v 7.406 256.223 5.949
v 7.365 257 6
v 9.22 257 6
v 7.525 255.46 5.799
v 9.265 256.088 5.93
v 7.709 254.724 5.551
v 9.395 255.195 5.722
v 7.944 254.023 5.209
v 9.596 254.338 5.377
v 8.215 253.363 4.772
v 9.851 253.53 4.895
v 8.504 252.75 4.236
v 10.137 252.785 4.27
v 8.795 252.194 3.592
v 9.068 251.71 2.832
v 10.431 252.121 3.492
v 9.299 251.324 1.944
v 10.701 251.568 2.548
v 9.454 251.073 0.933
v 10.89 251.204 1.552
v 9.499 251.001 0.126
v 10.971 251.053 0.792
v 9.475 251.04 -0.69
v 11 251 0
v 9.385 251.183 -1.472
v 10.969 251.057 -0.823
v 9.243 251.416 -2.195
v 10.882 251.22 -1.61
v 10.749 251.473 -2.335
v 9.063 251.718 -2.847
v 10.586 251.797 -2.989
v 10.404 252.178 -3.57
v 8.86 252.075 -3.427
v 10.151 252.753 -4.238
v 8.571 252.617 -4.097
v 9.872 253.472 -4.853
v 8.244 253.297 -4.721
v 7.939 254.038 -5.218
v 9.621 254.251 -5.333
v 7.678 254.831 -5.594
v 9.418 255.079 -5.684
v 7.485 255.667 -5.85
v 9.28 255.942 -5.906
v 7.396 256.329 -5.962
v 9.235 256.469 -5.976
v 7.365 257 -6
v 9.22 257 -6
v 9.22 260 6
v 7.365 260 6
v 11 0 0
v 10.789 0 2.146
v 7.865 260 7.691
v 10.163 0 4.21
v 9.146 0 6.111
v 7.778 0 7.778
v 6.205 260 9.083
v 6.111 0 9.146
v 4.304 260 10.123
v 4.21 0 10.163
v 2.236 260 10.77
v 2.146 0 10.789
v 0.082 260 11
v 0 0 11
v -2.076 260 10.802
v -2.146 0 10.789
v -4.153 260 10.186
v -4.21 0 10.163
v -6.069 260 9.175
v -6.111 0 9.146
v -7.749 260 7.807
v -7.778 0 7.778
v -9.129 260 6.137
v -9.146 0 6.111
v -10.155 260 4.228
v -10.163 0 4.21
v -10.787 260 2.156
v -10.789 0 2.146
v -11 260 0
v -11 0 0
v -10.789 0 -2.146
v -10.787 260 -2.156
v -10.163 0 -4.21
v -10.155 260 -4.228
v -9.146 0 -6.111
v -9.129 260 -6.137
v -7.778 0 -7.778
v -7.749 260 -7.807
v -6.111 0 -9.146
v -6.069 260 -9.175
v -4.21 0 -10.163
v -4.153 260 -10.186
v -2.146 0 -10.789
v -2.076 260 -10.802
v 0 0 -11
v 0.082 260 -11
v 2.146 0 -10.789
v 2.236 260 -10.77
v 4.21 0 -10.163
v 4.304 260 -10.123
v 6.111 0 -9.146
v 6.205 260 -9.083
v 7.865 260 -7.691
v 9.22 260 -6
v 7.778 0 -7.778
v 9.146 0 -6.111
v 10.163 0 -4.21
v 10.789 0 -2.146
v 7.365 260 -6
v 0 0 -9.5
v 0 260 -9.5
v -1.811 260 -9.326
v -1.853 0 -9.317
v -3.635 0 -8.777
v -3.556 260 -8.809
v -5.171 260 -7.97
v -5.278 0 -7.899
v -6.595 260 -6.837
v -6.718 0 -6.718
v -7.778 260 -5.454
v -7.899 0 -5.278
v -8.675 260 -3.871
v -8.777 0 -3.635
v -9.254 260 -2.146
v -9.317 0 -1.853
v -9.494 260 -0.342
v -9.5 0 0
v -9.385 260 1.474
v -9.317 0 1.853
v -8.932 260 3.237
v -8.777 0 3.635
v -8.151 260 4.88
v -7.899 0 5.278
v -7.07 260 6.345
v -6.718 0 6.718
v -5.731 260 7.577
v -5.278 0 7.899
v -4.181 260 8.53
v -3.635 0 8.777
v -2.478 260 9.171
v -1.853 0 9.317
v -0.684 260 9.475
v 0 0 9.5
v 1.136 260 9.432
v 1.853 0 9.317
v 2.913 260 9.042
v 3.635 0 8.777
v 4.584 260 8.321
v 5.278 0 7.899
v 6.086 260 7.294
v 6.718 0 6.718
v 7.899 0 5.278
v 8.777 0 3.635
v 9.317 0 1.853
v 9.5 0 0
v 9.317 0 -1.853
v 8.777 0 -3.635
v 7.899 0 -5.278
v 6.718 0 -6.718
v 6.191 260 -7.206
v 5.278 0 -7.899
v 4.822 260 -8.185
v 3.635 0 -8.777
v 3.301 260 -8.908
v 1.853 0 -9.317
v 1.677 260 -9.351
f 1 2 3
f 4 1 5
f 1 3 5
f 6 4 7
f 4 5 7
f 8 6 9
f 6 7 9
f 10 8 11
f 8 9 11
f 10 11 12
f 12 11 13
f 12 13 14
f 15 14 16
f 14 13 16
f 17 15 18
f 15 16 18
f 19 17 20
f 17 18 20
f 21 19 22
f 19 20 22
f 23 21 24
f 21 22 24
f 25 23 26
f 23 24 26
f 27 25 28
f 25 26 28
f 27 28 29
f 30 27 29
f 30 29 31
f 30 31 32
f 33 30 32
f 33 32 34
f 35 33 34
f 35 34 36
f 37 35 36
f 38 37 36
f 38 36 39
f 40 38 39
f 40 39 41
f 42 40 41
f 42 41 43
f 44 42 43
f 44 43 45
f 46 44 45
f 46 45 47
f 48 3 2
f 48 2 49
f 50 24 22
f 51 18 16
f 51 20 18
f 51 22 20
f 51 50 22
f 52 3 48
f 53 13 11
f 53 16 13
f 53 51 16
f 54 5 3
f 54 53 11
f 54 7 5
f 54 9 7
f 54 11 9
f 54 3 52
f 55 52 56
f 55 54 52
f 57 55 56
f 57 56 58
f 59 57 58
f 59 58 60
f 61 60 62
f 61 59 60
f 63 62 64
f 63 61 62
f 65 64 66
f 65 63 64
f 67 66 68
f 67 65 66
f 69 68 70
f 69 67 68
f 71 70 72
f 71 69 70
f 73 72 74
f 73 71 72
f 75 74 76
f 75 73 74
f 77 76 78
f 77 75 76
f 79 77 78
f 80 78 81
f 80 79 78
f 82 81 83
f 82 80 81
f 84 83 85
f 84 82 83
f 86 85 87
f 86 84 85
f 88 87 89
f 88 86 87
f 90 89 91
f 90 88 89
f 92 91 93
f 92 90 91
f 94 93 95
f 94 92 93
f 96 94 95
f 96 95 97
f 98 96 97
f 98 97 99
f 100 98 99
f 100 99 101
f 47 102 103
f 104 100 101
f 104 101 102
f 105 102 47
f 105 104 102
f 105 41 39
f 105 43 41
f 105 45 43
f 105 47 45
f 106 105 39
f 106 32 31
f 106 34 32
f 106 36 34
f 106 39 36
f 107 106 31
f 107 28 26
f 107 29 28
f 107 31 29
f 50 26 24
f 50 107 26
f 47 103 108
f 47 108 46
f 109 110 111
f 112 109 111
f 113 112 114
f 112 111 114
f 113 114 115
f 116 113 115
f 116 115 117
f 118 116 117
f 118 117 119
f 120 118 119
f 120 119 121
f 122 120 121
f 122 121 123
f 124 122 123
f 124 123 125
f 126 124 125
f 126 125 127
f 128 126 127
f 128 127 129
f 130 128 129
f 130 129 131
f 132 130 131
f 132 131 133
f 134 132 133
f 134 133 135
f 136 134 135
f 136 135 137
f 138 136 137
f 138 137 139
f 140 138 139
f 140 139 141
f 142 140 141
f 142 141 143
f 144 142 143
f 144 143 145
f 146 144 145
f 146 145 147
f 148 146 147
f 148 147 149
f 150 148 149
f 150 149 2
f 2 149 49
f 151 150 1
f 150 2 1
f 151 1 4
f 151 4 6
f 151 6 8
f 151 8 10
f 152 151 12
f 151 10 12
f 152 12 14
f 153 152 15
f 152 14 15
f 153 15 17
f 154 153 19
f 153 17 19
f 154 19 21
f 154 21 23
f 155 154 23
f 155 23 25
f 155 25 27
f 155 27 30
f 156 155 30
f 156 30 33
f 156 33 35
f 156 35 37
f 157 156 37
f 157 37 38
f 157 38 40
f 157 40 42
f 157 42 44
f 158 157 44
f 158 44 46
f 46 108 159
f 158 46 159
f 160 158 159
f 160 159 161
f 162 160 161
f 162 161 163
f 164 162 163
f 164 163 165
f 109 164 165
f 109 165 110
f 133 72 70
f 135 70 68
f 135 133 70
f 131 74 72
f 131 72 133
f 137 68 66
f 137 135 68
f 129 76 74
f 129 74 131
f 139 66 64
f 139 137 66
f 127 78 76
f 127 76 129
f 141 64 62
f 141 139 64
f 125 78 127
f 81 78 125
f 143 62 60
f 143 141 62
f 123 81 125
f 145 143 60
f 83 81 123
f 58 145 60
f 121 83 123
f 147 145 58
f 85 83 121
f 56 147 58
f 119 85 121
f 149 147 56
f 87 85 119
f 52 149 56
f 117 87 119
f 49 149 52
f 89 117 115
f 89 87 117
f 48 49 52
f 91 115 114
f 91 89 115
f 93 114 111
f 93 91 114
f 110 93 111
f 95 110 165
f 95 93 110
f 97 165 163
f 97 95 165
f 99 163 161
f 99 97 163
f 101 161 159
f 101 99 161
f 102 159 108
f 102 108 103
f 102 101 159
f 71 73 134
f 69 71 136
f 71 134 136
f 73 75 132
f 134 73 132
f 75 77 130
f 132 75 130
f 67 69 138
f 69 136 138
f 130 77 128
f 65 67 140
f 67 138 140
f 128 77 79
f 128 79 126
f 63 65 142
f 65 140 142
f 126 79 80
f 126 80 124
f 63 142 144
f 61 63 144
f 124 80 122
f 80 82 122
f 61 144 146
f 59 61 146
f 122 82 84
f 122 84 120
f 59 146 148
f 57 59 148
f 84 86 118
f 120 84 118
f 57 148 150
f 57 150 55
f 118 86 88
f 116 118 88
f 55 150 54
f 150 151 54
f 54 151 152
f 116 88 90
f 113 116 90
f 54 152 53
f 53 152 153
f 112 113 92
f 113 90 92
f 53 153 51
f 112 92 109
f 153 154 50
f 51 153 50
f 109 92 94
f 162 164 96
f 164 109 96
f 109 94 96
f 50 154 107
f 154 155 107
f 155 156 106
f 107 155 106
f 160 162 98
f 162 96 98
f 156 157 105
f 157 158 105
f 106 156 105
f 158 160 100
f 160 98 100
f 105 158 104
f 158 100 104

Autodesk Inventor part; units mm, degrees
ref_plane "XZ Plane" through (0, 0, 0) normal (0, 1, 0) x (-1, 0, 0)
ref_plane "XY Plane" through (0, 0, 0) normal (0, 0, 1) x (1, 0, 0)
sketch "Sketch1" plane through (0, 0, 0) normal (0, 0, 1) x (1, 0, 0)
  line L0 (0, 0) -> (0, 260)
  line L1 (0, 260) -> (11, 260)
  line L2 (11, 260) -> (11, 0)
  line L3 (11, 0) -> (0, 0)
  dimension "d0" = 22
  dimension "d1" = 260
revolve "Revolution1" add sketch "Sketch1" angle 360 about axis through (0, 0, 0) along (0, 1, 0)
sketch "Sketch2" plane through (0, 0, 0) normal (0, -1, 0) x (1, 0, 0)
  circle A0 centre (0, 0) radius 11 projected
hole "Hole1" at (0, 0, 0) direction (0, 1, 0) diameter 19 depth 260
ref_plane "Work Plane1" through (11, 0, 0) normal (1, 0, 0) x (0, 1, 0)
sketch "Sketch3" plane through (11, 0, 0) normal (1, 0, 0) x (0, 1, 0)
  line L0 (260, -11) -> (260, 11) projected
  line L1 (0, -11) -> (0, 11) projected
  line L2 (0, -11) -> (260, -11) projected
  line L3 (0, 11) -> (260, 11) projected
  line L4 (260, -6) -> (257, -6)
  arc A0 (257, 6) -> (257, -6) centre (257, 0) ccw
  line L5 (257, 6) -> (260, 6)
  point P0 (0, 0)
  point P1 (0, 0)
  dimension "d11" = 3
  dimension "d12" = 6
extrude "Extrusion1" cut sketch "Sketch3" against normal up to surface contours L4 A0 L5 L0
properties part number "132 part 1" material "Aluminum 6061-AHC"
